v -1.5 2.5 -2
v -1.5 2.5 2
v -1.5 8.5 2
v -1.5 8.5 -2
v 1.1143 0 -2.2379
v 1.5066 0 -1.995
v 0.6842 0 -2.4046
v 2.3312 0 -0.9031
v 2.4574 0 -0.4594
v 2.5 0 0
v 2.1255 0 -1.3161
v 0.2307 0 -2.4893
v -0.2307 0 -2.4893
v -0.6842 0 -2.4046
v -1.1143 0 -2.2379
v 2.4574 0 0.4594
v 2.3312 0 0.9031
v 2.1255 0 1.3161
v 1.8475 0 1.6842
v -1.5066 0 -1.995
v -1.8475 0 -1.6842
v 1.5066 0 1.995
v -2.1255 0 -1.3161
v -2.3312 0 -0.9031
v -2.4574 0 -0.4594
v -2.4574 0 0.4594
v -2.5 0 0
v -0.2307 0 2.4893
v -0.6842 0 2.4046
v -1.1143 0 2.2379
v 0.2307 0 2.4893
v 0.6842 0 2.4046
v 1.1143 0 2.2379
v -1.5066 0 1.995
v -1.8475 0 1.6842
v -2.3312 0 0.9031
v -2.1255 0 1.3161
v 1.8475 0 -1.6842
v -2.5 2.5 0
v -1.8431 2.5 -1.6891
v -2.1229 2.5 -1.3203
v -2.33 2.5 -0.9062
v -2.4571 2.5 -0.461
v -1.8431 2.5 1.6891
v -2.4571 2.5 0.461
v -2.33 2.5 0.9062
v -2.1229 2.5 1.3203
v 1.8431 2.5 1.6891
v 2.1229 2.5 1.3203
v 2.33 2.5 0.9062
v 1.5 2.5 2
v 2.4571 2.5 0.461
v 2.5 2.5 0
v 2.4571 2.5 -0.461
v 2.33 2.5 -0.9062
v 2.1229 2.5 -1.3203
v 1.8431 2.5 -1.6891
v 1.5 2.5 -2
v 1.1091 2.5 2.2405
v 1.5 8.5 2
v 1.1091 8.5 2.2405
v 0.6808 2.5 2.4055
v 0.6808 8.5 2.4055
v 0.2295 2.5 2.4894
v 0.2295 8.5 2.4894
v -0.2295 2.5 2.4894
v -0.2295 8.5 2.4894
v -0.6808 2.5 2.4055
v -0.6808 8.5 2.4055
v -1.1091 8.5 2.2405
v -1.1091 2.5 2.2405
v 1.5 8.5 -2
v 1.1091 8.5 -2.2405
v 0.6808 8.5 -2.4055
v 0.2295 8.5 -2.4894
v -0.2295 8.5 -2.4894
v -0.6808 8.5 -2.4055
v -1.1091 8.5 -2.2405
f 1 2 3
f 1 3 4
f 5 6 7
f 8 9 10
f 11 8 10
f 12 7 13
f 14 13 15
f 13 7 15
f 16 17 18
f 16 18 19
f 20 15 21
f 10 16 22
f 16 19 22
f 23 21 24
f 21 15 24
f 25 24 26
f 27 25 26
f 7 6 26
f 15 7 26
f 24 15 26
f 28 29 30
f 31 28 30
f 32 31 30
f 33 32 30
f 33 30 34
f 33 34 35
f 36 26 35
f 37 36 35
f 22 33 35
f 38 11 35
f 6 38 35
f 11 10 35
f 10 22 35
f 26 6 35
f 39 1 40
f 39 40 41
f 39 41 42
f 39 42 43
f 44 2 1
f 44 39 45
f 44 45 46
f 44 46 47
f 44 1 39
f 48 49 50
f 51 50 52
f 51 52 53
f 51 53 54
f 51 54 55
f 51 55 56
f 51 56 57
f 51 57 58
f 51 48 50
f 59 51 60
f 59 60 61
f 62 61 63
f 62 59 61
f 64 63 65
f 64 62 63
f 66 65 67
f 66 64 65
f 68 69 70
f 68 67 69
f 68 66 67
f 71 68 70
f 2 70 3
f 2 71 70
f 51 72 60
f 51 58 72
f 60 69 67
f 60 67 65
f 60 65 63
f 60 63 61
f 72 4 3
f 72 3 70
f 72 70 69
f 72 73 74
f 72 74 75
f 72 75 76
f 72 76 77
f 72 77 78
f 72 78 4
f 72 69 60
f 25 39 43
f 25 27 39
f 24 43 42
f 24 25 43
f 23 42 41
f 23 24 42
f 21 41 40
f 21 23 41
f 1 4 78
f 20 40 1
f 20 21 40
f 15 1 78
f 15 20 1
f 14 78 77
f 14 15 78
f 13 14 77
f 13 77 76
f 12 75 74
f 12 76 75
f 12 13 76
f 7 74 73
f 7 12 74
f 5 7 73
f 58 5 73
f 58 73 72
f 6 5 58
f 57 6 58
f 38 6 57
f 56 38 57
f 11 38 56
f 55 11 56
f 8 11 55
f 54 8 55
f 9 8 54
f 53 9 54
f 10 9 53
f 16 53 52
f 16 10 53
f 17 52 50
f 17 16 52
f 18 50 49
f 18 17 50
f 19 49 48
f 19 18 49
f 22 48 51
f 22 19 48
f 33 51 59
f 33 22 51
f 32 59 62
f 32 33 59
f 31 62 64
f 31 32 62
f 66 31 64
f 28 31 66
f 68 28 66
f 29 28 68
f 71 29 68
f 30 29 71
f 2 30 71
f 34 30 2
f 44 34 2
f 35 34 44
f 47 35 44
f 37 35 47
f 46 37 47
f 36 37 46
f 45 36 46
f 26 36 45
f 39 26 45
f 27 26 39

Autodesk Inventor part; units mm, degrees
ref_plane "YZ Plane" through (0, 0, 0) normal (1, 0, 0) x (0, 1, 0)
ref_plane "XZ Plane" through (0, 0, 0) normal (0, 1, 0) x (-1, 0, 0)
ref_plane "XY Plane" through (0, 0, 0) normal (0, 0, 1) x (1, 0, 0)
sketch "Sketch1" plane through (0, 0, 0) normal (0, 1, 0) x (-1, 0, 0)
  circle A0 centre (0, 0) radius 2.5
  dimension "d0" = 5
extrude "Extrusion1" add sketch "Sketch1" along normal blind 2.5
sketch "Sketch2" plane through (0, 2.5, 0) normal (0, 1, 0) x (1, 0, 0)
  circle A0 centre (0, 0) radius 2.5 projected
  line L0 (1.5, -2) -> (-1.5, -2)
  line L1 (-1.5, -2) -> (-1.5, 2)
  line L2 (-1.5, 2) -> (1.5, 2)
  line L3 (1.5, 2) -> (1.5, -2)
  line L4 (1.5, -2) -> (-1.5, 2) construction
  line L5 (-1.5, -2) -> (1.5, 2) construction
  arc A1 (-1.5, -2) -> (1.5, -2) centre (0, 0) ccw
  arc A2 (-1.5, 2) -> (-1.5, -2) centre (0, 0) ccw
  arc A3 (1.5, 2) -> (-1.5, 2) centre (0, 0) ccw
  arc A4 (1.5, -2) -> (1.5, 2) centre (0, 0) ccw
  dimension "d3" = 3
extrude "Extrusion2" add sketch "Sketch2" along normal blind 6 contours L2 A0 | L3 L0 L1 L2 | A0 L0
properties part number "small_stepper_shaft"
